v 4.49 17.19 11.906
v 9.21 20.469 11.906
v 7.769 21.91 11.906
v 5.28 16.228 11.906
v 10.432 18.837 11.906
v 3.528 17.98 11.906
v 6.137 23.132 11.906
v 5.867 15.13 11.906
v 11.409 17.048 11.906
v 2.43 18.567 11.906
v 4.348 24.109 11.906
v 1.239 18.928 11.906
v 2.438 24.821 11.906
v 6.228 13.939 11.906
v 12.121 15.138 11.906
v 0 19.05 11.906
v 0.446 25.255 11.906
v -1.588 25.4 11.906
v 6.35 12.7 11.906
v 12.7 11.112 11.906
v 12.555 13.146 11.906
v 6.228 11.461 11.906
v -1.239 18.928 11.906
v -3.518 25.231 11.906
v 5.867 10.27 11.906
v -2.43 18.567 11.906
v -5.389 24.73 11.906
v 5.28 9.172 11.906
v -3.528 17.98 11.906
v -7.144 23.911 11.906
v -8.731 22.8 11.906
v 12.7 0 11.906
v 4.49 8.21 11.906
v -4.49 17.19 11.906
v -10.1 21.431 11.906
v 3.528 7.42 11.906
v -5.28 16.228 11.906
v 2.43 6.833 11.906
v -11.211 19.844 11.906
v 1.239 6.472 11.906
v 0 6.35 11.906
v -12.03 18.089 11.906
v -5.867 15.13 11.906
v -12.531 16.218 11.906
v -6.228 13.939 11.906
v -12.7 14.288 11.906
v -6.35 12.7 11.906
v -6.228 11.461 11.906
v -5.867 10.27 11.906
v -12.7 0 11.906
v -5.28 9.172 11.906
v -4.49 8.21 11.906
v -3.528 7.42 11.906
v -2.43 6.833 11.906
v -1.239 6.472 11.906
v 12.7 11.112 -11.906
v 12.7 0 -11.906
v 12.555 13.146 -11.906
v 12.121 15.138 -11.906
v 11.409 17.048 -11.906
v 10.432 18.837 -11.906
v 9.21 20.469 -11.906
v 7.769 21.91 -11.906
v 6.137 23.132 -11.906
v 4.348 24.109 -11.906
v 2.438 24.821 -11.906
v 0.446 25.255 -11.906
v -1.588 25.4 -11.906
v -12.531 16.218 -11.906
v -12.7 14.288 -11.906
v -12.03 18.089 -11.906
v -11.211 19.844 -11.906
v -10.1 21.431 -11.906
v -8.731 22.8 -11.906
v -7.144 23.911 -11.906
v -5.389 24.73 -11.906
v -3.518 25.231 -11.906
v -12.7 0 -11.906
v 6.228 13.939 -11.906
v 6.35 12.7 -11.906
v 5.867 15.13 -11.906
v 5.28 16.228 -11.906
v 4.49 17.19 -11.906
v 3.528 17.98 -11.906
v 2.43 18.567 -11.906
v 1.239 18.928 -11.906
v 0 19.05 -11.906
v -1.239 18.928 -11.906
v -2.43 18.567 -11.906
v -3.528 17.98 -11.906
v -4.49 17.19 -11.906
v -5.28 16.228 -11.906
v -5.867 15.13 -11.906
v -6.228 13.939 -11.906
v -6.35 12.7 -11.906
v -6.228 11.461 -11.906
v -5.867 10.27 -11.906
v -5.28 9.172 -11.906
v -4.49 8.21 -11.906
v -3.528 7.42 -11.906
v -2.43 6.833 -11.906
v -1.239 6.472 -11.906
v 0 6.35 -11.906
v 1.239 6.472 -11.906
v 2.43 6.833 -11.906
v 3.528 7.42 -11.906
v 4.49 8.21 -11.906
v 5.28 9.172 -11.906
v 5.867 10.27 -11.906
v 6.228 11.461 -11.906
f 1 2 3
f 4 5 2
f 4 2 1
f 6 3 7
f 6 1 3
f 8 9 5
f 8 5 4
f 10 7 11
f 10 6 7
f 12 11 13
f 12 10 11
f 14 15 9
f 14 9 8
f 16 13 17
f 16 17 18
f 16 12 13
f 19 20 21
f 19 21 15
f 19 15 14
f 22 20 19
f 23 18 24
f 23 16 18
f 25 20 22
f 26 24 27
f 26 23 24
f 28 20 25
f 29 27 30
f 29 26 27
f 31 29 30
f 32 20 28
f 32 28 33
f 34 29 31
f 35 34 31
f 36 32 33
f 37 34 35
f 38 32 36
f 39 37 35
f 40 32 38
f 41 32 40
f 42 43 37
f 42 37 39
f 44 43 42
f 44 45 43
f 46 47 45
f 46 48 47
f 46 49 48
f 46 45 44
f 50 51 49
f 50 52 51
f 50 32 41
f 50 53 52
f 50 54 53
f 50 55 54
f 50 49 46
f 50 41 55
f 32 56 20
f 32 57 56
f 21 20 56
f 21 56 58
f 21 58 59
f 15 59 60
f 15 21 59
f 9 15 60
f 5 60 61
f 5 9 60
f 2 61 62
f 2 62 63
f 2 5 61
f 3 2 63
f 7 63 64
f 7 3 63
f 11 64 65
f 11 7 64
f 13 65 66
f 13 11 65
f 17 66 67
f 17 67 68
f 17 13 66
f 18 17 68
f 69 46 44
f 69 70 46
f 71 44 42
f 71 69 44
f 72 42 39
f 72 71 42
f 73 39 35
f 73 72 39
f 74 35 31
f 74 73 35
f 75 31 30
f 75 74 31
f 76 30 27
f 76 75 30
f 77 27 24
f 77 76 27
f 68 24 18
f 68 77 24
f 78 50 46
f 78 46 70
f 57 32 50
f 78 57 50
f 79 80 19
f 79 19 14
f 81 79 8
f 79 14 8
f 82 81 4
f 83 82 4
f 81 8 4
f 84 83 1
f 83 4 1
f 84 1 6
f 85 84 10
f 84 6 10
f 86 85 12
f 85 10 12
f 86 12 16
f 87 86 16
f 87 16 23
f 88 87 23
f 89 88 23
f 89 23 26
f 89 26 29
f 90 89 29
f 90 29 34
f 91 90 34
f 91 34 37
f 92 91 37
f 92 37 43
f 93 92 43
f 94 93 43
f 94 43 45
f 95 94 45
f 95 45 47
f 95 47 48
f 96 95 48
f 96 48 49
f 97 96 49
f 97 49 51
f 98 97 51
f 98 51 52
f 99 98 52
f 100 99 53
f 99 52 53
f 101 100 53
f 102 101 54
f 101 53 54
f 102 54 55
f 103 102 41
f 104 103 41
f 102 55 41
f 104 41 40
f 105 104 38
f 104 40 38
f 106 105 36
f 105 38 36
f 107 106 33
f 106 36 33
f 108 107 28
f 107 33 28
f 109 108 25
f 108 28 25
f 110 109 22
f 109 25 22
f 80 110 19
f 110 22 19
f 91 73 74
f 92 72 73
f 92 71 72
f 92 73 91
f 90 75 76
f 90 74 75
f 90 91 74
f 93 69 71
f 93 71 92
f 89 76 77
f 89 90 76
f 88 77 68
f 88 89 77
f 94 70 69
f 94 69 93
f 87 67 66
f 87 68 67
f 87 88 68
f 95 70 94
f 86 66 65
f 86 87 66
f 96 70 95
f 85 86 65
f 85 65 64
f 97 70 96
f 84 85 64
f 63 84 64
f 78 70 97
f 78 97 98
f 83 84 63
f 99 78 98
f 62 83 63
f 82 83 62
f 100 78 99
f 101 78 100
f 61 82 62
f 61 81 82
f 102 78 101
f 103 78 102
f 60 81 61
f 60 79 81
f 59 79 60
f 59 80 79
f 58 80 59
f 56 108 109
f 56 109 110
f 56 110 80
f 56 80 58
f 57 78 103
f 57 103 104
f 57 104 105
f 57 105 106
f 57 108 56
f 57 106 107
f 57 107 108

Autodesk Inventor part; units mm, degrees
ref_plane "YZ Plane" through (0, 0, 0) normal (1, 0, 0) x (0, 1, 0)
ref_plane "XZ Plane" through (0, 0, 0) normal (0, 1, 0) x (-1, 0, 0)
ref_plane "XY Plane" through (0, 0, 0) normal (0, 0, 1) x (1, 0, 0)
sketch "Sketch1" plane through (0, 0, 0) normal (0, 1, 0) x (-1, 0, 0)
  line L0 (-12.7, 11.9062) -> (12.7, 11.9062)
  line L1 (12.7, 11.9062) -> (12.7, -11.9062)
  line L2 (12.7, -11.9062) -> (-12.7, -11.9062)
  line L3 (-12.7, -11.9062) -> (-12.7, 11.9062)
  point P0 (0, 0)
  point P1 (-12.7, 0)
  point P2 (0, 11.9062)
  dimension "d0" = 25.4
  dimension "d1" = 23.8125
extrude "Extrusion1" add sketch "Sketch1" along normal blind 25.4
sketch "Sketch2" plane through (-12.7, 0, 11.9062) normal (0, 0, 1) x (1, 0, 0)
  circle A0 centre (12.7, 12.7) radius 6.35
  line L0 (0, 0) -> (0, 25.4) projected
  line L1 (25.4, 0) -> (0, 0) projected
  point P0 (12.7, 0)
  point P1 (0, 12.7)
  point P2 (12.7, 0)
  dimension "d4" = 12.7
extrude "Extrusion2" cut sketch "Sketch2" against normal blind 50.8
fillet "Fillet1" radius 14.2875 1 edges at (12.7, 25.4, 0)
fillet "Fillet2" radius 11.1125 1 edges at (-12.7, 25.4, 0)
properties part number "Gounded Clevis"
